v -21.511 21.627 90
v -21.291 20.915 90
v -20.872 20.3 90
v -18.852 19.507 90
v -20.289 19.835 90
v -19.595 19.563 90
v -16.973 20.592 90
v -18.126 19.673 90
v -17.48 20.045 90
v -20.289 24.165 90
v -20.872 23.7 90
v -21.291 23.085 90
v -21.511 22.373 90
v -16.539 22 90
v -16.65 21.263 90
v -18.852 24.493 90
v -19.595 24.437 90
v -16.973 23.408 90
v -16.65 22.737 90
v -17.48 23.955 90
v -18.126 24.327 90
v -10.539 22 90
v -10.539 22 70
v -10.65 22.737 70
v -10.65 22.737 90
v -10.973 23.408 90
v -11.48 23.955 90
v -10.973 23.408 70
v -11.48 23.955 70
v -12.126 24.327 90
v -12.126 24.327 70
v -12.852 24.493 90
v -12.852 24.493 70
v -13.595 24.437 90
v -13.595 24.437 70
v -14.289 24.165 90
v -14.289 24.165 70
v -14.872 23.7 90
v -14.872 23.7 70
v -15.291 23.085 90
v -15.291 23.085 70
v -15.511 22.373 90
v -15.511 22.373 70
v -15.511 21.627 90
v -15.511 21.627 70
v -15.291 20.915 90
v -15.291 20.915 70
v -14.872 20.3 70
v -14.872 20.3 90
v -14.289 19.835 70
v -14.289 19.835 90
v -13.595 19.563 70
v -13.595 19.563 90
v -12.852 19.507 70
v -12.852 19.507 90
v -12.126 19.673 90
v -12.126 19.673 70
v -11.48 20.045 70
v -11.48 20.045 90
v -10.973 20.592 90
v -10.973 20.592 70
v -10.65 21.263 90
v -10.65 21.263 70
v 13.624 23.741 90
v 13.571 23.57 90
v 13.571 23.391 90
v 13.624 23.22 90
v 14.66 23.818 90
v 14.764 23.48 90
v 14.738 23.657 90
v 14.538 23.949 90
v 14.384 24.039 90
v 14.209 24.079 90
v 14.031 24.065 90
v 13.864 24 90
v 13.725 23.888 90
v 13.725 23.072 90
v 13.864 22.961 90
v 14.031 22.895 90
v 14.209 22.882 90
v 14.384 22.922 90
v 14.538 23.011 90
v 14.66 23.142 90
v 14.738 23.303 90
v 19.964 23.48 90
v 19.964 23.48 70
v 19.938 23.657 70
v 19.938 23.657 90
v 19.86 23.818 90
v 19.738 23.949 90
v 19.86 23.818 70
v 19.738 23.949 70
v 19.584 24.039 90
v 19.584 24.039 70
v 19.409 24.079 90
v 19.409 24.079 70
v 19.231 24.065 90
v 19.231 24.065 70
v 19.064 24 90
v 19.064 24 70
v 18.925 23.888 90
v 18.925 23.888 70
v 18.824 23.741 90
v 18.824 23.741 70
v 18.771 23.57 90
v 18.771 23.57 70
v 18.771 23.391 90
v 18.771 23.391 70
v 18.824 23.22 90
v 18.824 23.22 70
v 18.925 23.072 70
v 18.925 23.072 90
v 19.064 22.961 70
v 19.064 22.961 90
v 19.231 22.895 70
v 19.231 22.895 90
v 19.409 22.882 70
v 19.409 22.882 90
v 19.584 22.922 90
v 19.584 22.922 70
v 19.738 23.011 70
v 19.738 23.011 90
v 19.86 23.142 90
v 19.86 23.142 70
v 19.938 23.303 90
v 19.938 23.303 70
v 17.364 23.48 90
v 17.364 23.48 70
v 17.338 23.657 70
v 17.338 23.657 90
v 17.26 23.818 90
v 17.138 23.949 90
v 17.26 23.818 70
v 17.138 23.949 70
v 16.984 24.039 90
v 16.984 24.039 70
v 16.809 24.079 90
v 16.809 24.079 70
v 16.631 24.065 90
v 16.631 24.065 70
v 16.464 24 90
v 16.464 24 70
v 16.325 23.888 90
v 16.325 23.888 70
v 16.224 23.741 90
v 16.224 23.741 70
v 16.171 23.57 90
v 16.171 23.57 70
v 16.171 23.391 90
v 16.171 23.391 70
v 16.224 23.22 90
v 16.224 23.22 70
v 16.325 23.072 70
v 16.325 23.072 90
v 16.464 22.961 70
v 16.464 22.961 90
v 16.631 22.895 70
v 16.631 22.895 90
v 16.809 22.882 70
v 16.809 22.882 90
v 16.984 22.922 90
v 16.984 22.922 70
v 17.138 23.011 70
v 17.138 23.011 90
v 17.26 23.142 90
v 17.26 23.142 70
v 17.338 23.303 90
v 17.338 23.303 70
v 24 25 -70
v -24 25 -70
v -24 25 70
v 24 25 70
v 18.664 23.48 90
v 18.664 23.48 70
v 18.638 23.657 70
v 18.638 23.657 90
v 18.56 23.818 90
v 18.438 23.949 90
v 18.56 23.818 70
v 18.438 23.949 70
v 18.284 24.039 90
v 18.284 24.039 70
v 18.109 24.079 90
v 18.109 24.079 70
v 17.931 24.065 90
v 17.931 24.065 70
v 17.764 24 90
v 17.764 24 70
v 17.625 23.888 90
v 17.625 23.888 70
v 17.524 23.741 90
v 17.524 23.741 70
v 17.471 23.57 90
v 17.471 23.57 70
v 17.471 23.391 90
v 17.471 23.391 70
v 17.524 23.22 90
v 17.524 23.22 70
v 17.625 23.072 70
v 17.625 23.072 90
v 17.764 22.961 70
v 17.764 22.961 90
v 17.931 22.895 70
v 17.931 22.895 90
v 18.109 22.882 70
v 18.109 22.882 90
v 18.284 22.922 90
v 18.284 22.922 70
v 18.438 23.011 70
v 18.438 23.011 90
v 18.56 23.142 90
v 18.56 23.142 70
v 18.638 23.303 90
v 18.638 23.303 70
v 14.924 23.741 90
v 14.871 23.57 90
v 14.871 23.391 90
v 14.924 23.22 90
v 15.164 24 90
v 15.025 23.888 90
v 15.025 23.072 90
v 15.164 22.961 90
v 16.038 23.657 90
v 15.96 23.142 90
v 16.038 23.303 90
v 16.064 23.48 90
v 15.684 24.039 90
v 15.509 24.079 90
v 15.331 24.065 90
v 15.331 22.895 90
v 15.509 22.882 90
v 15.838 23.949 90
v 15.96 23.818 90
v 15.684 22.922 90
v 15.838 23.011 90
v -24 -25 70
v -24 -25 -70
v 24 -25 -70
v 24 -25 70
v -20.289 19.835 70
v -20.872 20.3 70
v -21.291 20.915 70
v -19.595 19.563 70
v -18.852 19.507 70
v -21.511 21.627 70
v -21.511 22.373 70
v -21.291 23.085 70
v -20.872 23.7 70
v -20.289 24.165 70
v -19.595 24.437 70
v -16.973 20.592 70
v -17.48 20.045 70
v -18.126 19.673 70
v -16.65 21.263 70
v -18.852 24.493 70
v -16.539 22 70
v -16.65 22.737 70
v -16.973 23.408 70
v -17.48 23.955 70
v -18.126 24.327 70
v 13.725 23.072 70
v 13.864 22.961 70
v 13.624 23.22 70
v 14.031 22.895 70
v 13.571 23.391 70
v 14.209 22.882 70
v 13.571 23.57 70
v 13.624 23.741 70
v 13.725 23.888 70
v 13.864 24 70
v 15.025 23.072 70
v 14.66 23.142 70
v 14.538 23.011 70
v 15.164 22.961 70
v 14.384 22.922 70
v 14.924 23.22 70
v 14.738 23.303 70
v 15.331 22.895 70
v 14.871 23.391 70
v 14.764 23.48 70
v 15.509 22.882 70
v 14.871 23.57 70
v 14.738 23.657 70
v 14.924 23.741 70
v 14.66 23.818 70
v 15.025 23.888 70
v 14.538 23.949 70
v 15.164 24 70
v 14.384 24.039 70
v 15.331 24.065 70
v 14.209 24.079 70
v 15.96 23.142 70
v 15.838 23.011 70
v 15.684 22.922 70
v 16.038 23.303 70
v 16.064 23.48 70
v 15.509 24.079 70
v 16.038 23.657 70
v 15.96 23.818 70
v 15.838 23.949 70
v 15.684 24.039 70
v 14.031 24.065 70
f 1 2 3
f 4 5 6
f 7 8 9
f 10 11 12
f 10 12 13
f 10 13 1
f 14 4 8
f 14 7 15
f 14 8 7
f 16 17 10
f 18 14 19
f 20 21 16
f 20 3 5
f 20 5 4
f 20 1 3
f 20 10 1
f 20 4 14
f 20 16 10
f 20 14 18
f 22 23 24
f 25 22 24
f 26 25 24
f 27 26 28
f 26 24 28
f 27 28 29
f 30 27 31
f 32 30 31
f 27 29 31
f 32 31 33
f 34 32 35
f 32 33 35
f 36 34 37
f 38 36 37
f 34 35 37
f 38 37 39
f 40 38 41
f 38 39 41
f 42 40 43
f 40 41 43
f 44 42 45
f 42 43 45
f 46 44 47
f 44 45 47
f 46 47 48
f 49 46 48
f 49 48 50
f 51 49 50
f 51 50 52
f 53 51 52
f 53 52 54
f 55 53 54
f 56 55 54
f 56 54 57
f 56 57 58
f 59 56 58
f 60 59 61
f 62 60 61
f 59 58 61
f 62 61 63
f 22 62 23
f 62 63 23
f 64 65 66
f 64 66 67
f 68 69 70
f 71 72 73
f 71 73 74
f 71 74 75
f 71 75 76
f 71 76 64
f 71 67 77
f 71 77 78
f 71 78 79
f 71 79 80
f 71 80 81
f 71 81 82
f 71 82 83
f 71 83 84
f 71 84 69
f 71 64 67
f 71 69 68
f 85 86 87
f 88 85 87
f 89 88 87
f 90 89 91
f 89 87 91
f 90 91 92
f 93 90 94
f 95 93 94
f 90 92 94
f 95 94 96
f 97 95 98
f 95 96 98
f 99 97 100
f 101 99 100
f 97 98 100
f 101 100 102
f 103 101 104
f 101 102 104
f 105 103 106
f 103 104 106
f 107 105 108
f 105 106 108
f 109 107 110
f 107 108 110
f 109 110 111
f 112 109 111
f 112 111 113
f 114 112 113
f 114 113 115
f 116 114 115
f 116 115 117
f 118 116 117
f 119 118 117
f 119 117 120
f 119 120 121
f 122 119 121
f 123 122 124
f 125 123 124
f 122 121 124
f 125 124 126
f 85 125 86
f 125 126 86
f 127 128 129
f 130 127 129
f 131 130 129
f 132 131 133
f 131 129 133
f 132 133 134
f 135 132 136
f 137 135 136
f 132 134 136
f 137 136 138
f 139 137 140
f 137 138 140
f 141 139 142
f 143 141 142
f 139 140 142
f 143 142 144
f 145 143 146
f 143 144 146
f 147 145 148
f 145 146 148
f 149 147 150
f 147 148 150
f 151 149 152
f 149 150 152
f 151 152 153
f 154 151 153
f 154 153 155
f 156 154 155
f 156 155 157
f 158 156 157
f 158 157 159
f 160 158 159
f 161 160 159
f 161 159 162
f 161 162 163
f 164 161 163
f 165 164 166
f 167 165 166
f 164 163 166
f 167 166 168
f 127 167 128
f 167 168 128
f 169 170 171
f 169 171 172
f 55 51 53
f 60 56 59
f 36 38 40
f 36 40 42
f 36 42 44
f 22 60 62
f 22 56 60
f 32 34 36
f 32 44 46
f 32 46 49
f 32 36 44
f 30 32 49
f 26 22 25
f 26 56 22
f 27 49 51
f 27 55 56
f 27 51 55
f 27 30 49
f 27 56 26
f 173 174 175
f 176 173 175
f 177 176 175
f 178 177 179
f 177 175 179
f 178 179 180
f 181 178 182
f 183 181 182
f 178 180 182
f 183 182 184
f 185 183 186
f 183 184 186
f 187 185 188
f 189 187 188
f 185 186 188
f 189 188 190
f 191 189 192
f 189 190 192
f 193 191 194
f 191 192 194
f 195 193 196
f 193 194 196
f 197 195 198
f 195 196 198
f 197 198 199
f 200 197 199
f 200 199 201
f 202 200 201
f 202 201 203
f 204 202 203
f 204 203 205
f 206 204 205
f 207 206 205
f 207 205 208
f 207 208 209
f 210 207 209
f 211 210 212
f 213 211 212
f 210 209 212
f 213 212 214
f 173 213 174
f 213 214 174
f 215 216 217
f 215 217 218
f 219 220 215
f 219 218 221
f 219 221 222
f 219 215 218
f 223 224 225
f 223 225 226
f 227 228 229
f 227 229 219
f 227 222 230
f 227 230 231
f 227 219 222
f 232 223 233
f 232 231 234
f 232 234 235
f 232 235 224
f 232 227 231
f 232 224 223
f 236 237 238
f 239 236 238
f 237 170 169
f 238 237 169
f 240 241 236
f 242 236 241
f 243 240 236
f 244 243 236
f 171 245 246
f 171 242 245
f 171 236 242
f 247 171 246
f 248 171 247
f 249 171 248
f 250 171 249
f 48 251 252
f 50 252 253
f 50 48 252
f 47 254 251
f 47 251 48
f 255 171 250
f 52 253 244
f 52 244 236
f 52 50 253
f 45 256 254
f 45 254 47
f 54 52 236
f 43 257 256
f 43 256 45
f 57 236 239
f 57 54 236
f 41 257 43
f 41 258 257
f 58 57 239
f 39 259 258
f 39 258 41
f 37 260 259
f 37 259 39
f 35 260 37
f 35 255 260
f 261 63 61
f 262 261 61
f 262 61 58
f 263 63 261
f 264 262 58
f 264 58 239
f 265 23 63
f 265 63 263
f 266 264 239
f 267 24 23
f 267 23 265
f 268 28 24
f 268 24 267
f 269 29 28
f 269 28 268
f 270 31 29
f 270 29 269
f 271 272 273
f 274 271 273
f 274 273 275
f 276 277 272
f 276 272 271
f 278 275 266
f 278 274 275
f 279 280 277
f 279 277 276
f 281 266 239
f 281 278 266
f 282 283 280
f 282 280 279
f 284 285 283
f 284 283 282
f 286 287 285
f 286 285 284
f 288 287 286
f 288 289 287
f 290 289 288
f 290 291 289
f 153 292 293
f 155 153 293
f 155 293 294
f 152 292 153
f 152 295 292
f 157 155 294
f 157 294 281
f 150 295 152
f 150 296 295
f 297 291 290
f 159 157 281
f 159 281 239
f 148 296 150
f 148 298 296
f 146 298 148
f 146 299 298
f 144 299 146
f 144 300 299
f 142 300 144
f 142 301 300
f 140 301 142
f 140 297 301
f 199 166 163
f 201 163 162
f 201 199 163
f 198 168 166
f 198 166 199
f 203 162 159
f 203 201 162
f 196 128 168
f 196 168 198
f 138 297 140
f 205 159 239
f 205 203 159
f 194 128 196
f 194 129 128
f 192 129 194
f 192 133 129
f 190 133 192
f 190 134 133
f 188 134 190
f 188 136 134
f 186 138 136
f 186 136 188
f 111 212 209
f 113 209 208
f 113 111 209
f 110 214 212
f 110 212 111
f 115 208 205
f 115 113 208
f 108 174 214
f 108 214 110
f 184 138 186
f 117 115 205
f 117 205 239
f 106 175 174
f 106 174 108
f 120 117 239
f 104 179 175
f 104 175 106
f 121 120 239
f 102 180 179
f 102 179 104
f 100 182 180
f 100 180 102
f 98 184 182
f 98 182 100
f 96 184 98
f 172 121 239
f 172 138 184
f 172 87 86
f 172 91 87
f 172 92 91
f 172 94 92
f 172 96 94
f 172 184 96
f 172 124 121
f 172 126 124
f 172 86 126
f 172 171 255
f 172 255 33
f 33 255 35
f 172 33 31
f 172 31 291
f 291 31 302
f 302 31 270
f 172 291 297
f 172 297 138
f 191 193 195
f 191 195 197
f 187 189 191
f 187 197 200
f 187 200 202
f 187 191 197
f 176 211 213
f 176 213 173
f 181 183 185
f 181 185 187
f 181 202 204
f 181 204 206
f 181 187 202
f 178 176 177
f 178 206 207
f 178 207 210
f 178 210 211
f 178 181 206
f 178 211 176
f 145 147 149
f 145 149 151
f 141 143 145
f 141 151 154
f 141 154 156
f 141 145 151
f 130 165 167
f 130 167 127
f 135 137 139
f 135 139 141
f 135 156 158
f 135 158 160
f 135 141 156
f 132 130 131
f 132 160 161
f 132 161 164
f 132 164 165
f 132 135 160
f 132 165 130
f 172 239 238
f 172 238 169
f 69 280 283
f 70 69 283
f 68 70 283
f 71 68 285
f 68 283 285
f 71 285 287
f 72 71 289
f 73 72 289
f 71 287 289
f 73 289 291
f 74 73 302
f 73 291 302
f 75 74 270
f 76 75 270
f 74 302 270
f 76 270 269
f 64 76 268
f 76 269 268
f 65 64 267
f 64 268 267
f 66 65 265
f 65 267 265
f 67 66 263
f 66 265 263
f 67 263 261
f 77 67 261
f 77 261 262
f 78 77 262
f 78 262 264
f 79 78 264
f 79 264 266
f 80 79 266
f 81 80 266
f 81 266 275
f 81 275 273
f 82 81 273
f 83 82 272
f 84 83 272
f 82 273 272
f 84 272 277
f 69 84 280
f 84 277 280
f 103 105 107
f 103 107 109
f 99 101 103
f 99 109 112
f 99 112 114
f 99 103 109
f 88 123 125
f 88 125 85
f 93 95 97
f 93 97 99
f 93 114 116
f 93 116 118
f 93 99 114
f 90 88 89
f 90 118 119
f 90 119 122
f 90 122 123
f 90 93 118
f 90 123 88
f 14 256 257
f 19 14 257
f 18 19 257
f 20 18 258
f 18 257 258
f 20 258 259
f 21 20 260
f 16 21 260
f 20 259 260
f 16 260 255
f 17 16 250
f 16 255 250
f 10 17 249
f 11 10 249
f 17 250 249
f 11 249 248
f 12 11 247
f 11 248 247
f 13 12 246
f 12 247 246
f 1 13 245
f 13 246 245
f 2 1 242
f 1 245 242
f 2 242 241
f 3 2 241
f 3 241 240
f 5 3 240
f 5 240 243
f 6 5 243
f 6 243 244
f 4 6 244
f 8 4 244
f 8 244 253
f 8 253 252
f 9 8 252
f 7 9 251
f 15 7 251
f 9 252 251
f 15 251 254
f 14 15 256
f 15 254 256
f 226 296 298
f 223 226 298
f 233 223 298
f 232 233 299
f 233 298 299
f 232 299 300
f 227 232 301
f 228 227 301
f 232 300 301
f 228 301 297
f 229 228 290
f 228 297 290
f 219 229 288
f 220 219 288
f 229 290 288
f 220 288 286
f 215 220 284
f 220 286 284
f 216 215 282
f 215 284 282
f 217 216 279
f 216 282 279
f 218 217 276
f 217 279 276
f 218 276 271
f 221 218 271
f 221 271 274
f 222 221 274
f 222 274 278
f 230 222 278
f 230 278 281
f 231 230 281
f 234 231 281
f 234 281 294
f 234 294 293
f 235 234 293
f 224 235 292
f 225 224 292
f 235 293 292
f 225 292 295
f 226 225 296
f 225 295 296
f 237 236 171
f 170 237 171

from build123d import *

# Parameters (mm, degrees)
ESQUISSE1_W        = 48
ESQUISSE1_H        = 50
BOSS_EXTRU_1_DEPTH = 70
ESQUISSE2_R        = 2.5
ESQUISSE2_R_2      = 0.6
BOSS_EXTRU_2_DEPTH = 20


with BuildPart() as part:
    # Esquisse1 → Boss.-Extru.1 (new, symmetric)
    with BuildSketch(Plane.XY):
        Rectangle(ESQUISSE1_W, ESQUISSE1_H)
    extrude(amount=BOSS_EXTRU_1_DEPTH, both=True)

    # Esquisse2 → Boss.-Extru.2 (add)
    with BuildSketch(Plane.XY.offset(70)):
        with Locations((-19.03905832, 22)):
            Circle(ESQUISSE2_R)
        with Locations((-13.03905832, 22)):
            Circle(ESQUISSE2_R)
        with Locations((15.464385939, 23.480295556)):
            Circle(ESQUISSE2_R_2)
        with Locations((16.764385939, 23.480295556)):
            Circle(ESQUISSE2_R_2)
        with Locations((18.064385939, 23.480295556)):
            Circle(ESQUISSE2_R_2)
        with Locations((19.364385939, 23.480295556)):
            Circle(ESQUISSE2_R_2)
        with Locations((14.164385939, 23.480295556)):
            Circle(ESQUISSE2_R_2)
    extrude(amount=BOSS_EXTRU_2_DEPTH)


solid = part.part
